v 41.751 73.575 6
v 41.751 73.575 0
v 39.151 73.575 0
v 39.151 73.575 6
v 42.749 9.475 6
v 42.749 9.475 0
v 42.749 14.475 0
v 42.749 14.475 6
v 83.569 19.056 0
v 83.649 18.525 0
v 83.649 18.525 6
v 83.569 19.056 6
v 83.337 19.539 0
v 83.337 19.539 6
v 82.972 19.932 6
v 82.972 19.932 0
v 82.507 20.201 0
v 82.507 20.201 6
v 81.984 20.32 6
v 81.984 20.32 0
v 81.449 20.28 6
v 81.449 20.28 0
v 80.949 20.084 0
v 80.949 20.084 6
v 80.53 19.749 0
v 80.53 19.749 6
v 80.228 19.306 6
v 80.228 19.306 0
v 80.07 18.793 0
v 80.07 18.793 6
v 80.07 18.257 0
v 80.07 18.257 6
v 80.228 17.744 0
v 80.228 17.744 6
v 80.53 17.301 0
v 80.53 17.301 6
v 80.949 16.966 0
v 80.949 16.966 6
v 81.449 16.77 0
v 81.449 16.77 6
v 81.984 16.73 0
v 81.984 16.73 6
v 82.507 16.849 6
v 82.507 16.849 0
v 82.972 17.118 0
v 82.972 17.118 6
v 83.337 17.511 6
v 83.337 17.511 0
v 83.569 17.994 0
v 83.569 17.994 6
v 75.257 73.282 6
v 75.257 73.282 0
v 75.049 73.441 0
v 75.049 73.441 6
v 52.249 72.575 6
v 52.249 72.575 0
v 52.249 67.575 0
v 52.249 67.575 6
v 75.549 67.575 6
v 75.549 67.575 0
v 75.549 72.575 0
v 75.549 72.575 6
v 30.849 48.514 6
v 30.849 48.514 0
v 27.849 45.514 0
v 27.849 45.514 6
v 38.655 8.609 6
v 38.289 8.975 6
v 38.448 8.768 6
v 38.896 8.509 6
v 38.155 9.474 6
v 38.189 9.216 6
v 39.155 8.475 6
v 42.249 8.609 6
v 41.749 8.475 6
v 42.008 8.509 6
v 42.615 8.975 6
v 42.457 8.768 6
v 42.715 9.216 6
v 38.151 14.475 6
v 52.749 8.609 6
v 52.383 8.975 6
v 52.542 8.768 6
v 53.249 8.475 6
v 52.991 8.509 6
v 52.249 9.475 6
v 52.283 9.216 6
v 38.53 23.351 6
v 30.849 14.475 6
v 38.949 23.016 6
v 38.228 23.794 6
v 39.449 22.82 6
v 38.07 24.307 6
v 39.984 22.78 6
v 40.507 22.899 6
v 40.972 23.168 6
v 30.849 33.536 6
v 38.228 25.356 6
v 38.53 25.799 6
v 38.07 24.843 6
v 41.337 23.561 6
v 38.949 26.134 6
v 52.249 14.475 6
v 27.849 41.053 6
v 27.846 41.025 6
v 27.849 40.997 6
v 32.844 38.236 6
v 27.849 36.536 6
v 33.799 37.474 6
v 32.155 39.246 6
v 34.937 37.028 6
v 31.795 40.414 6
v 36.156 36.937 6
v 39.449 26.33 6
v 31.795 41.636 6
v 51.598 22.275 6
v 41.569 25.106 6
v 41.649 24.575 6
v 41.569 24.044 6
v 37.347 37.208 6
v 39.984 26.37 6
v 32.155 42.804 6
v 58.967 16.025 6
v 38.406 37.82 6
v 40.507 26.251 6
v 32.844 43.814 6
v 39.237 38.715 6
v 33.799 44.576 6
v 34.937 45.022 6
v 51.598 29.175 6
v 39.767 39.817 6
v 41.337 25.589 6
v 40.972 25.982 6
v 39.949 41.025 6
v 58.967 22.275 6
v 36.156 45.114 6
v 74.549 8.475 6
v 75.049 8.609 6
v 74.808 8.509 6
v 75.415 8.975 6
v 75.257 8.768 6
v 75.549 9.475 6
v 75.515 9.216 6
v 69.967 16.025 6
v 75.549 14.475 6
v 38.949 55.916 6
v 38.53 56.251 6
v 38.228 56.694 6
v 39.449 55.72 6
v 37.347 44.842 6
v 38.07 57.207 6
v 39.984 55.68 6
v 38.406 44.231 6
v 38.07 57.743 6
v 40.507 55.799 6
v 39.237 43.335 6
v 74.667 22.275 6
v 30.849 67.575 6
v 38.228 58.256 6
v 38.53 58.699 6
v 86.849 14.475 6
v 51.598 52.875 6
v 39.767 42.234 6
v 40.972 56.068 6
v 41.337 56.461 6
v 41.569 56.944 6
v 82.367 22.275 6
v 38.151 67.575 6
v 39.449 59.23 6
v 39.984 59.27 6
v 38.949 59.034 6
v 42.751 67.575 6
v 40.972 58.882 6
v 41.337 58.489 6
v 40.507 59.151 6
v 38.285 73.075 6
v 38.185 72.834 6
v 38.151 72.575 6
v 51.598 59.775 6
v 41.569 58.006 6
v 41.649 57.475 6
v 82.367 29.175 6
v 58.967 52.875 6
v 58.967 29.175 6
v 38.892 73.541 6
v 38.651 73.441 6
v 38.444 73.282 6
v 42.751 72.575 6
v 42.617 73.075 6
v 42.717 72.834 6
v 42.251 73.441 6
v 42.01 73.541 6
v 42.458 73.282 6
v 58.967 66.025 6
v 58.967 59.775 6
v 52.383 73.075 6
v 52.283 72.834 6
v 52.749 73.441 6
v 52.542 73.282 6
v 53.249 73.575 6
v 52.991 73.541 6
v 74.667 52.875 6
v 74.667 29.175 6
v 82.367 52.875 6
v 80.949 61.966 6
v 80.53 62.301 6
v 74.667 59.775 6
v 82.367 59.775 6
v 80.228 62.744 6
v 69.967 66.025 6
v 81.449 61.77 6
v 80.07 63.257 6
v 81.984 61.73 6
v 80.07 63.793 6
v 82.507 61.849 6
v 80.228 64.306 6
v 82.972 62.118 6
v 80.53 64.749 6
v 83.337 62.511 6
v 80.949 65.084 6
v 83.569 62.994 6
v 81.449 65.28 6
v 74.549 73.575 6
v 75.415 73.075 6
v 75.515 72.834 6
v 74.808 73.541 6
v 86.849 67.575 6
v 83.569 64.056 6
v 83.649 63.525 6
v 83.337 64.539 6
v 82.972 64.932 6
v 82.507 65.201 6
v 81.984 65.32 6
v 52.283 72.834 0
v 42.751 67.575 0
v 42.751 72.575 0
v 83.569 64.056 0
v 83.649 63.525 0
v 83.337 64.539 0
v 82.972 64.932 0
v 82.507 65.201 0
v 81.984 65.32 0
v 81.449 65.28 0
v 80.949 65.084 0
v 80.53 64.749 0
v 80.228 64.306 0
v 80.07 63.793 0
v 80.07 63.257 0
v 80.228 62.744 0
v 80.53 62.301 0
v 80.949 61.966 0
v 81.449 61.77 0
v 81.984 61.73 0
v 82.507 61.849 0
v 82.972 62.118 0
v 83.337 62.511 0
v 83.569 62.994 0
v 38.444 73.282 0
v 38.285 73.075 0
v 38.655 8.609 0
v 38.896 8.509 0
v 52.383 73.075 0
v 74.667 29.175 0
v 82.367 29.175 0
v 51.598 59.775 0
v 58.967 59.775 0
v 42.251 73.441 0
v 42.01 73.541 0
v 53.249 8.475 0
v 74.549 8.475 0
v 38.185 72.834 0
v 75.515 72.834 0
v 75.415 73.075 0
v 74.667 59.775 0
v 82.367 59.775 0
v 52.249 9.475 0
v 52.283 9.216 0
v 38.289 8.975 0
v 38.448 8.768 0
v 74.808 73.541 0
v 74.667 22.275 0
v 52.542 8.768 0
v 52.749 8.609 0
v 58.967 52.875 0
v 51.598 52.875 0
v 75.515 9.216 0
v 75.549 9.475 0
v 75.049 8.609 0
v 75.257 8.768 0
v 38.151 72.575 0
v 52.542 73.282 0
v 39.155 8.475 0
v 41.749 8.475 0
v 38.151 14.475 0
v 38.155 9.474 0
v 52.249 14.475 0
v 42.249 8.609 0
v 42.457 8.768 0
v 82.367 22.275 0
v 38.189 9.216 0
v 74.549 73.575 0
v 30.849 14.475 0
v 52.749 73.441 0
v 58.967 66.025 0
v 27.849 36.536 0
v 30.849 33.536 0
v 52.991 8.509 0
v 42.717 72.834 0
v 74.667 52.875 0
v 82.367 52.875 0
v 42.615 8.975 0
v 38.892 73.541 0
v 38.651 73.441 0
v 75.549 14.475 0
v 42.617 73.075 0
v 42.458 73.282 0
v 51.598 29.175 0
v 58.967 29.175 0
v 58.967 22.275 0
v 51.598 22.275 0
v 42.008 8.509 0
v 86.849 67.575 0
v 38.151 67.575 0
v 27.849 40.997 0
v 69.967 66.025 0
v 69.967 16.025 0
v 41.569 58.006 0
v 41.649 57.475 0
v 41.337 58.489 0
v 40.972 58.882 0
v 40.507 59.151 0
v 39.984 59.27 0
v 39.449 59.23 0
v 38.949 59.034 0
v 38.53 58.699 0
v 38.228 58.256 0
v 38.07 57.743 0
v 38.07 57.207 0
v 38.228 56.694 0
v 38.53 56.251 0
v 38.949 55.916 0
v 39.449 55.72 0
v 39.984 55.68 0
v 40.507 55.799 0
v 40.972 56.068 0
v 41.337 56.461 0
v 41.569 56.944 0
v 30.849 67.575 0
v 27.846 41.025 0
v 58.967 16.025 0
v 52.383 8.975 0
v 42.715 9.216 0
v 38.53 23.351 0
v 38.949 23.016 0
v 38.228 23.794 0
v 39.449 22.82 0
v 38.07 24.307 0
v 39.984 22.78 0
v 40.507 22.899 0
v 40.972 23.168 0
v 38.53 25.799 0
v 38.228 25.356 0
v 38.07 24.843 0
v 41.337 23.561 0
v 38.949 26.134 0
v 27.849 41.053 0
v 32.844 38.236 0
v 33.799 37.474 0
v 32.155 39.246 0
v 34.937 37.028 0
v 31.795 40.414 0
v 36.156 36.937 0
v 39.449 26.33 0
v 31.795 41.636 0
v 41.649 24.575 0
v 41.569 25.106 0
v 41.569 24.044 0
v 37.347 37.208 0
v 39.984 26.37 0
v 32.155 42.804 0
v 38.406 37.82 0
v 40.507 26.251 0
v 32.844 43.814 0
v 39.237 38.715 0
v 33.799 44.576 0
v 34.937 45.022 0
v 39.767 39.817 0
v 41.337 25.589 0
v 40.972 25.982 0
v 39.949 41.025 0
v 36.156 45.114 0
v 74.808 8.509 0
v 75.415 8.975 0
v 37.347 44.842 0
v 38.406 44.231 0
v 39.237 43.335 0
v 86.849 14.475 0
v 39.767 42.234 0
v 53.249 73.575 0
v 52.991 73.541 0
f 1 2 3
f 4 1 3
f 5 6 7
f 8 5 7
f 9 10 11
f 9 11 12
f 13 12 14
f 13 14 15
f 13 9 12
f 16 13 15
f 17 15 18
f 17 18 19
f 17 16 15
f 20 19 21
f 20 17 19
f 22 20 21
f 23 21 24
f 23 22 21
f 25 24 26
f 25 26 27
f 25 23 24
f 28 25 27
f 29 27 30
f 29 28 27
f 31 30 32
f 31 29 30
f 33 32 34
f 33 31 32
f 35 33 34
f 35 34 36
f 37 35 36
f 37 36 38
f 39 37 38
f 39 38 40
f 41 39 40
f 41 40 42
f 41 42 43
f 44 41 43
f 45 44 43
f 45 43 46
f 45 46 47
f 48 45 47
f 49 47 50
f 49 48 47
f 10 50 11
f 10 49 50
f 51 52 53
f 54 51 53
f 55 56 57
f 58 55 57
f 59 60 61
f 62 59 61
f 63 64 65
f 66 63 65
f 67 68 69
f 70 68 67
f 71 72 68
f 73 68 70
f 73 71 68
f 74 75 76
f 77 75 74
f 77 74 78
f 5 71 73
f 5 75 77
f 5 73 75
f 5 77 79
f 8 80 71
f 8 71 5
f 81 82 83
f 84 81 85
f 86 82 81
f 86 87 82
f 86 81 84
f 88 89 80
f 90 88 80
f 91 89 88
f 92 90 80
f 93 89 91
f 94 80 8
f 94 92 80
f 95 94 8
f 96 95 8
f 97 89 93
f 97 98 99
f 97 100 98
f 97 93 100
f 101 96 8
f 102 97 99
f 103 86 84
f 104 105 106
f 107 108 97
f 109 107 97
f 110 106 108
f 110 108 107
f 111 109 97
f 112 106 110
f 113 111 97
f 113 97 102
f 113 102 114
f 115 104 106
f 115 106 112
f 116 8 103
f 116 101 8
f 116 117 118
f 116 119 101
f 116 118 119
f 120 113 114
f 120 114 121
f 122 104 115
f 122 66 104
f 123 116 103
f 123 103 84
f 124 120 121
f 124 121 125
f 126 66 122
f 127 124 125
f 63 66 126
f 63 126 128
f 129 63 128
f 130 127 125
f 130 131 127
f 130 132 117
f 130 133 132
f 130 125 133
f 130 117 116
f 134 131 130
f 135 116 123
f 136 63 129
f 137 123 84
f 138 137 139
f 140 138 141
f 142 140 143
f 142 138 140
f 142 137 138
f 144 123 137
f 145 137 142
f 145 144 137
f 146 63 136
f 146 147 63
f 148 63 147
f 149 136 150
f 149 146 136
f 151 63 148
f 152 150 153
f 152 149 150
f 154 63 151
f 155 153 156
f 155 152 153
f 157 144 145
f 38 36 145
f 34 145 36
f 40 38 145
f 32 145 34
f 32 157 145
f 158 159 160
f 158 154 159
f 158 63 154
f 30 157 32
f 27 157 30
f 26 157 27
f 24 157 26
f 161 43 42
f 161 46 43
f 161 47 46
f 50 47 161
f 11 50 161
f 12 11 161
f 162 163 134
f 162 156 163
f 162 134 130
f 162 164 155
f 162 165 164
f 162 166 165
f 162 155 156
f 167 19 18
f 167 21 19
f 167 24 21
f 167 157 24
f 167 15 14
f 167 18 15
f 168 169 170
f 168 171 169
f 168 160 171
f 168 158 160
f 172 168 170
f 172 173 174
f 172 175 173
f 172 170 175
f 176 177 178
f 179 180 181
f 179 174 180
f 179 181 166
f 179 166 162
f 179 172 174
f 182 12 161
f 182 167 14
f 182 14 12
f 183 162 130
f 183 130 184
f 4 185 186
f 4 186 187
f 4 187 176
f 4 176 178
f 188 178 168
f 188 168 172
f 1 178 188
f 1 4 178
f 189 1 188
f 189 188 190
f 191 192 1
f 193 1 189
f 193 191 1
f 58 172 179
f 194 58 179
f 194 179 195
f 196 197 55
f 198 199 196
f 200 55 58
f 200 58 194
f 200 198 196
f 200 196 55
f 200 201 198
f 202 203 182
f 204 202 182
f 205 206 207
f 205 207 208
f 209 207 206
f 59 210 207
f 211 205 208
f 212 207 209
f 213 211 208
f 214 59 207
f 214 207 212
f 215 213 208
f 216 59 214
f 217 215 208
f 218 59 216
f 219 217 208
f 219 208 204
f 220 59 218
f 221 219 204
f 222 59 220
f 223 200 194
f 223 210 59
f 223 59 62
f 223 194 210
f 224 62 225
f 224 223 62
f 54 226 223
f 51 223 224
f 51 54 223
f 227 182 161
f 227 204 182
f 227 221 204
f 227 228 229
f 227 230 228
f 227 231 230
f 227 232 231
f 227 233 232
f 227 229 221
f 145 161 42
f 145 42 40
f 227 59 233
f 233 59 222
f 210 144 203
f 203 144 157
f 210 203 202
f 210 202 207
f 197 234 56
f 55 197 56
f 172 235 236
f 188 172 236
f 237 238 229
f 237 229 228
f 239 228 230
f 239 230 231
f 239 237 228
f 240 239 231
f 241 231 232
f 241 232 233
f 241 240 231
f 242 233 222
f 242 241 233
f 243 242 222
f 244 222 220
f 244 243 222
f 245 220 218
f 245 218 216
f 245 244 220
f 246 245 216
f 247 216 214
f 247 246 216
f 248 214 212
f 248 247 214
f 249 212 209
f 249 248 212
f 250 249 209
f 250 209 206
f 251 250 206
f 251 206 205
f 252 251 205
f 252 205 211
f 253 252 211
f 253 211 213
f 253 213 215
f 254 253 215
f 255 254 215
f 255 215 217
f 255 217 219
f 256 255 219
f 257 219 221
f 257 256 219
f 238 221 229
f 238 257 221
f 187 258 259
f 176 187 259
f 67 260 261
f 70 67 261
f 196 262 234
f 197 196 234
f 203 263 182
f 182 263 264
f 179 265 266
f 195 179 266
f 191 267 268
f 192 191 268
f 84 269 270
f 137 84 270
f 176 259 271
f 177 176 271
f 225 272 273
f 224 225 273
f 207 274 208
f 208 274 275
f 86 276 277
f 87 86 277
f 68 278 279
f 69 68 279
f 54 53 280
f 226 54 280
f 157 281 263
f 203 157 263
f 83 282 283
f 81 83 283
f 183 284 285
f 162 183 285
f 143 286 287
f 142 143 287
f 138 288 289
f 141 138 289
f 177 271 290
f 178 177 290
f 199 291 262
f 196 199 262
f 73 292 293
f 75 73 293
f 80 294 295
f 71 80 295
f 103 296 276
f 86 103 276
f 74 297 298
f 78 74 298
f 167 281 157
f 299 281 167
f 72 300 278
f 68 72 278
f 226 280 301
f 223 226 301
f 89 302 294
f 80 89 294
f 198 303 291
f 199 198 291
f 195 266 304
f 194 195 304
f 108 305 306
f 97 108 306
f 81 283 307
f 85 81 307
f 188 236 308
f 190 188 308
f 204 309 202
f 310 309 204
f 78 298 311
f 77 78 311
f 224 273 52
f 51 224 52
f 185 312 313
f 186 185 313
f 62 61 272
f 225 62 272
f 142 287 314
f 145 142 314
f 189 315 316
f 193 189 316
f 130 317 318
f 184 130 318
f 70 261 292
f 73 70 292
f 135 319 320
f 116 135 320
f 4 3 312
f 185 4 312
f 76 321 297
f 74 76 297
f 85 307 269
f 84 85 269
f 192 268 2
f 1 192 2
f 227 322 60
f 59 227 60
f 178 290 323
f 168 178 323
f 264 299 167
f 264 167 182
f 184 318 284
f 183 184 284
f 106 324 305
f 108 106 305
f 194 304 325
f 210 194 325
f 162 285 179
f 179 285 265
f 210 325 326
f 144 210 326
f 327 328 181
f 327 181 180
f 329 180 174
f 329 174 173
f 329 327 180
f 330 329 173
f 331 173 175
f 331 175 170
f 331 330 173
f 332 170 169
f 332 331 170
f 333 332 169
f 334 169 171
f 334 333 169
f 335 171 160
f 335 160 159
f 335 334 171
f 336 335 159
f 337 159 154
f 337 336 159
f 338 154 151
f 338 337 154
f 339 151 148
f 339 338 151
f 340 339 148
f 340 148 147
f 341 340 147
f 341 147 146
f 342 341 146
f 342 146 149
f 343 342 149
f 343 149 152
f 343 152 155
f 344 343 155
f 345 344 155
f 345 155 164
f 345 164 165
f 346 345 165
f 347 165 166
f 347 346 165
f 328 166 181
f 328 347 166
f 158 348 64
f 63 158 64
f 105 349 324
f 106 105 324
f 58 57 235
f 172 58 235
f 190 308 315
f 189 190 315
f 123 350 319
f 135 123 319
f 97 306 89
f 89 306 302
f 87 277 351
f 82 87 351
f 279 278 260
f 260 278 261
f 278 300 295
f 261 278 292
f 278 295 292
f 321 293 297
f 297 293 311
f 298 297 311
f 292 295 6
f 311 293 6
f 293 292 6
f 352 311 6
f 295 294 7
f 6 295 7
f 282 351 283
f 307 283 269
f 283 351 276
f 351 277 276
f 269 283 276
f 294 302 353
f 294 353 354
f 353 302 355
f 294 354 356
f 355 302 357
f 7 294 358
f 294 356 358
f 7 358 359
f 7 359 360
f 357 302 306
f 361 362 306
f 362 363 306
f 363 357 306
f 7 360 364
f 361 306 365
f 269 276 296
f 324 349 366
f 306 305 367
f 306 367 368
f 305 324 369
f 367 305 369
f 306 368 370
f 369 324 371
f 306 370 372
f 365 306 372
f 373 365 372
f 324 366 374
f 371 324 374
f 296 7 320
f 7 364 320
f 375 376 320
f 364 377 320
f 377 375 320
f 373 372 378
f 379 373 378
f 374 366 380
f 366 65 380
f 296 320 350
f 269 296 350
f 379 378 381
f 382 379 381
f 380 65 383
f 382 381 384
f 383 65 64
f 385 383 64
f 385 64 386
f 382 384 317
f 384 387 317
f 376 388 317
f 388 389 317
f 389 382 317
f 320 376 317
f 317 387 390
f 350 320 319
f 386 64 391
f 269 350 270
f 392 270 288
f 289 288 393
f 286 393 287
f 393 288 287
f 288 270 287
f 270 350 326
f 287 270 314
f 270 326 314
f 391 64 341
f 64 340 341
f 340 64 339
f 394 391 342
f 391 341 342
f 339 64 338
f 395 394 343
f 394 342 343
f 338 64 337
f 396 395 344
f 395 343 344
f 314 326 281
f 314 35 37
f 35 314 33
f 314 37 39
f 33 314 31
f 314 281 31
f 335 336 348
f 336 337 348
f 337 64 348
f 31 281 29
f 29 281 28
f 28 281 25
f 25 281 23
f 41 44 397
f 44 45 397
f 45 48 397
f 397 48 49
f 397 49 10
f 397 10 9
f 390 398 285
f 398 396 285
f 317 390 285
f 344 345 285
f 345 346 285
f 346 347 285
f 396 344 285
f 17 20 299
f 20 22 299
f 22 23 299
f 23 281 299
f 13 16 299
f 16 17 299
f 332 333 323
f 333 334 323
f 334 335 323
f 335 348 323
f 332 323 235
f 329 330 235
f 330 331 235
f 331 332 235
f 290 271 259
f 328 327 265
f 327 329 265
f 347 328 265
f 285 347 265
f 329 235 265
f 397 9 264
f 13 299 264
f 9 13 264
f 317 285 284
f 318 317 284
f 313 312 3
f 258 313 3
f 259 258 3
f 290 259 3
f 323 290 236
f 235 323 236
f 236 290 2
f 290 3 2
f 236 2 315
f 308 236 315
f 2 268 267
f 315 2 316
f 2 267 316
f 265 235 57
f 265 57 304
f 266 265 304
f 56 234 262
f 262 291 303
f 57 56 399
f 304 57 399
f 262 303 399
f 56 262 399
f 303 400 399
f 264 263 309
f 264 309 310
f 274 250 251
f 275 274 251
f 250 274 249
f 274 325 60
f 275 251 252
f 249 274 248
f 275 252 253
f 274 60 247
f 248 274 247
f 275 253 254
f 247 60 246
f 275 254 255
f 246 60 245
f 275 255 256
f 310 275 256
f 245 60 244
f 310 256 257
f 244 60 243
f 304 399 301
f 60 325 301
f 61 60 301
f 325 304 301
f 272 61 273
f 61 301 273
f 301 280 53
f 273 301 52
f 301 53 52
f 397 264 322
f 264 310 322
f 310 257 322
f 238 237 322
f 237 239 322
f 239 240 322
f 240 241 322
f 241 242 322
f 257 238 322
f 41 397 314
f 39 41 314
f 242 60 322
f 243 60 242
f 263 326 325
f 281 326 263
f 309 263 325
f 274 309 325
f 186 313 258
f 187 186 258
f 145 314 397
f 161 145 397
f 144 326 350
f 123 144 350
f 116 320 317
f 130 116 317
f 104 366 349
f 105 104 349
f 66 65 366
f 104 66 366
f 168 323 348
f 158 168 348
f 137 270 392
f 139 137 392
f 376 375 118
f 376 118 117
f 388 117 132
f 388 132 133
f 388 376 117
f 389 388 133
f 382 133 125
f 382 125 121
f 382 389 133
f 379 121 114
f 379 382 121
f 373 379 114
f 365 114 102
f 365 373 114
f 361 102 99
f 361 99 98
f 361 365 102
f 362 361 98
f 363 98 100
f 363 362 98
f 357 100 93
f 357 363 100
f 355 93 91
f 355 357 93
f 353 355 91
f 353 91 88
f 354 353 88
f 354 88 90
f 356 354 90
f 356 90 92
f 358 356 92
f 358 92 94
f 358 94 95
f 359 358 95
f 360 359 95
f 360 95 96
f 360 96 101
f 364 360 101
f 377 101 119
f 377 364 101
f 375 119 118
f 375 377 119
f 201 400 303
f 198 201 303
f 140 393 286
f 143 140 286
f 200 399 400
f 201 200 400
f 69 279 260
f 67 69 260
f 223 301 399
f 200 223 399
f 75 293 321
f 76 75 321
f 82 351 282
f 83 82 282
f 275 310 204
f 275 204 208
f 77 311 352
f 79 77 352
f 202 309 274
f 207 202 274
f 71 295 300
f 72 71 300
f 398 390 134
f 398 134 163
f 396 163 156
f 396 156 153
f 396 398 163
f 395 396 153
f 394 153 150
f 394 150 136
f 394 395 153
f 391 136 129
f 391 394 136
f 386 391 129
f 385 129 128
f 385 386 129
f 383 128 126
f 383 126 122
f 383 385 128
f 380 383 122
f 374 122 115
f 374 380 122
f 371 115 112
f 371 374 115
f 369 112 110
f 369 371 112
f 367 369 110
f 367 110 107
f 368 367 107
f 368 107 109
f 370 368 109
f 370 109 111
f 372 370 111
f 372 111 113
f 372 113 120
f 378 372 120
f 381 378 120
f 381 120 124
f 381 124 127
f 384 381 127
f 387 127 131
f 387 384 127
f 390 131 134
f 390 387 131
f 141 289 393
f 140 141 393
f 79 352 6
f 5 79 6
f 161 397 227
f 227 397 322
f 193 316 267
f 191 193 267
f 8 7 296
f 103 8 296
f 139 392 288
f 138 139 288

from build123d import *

# Parameters (mm, degrees)
MODEL_R                  = 1.8
MODEL_R_2                = 4.1
MODEL_W                  = 7.7
MODEL_H                  = 6.9
RESSALTO_EXTRUS_O1_DEPTH = 6


with BuildPart() as part:
    # Model → Ressalto-extrusão1 (new body)
    with BuildSketch(Plane.XY):
        Polygon((52.383398063, 73.075042987), (52.28349764, 72.833862032), (52.249423467, 72.575042987), (52.249423467, 67.575042987), (42.750846371, 67.575042987), (42.750846371, 72.575042987), (42.716772197, 72.833862032), (42.616871774, 73.075042987), (42.457953152, 73.282149768), (42.250846371, 73.441068391), (42.009665416, 73.540968814), (41.750846371, 73.575042987), (39.151153585, 73.575042987), (38.89233454, 73.540968814), (38.651153585, 73.441068391), (38.444046804, 73.282149768), (38.285128182, 73.075042987), (38.185227759, 72.833862032), (38.151153585, 72.575042987), (38.151153585, 67.575042987), (30.849423467, 67.575042987), (30.849423467, 48.514129082), (27.849423467, 45.514129082), (27.849423467, 41.05308967), (27.845731051, 41.025042987), (27.849423467, 40.996996305), (27.849423467, 36.535956893), (30.849423467, 33.535956893), (30.849423467, 14.475042987), (38.151153585, 14.475042987), (38.155087445, 9.474256339), (38.189331183, 9.215590795), (38.289324067, 8.974588885), (38.448258531, 8.767658139), (38.655314239, 8.608886505), (38.896394733, 8.509083236), (39.155087136, 8.475042987), (41.749423467, 8.475042987), (42.008242512, 8.509117161), (42.249423467, 8.609017584), (42.456530248, 8.767936206), (42.61544887, 8.975042987), (42.715349293, 9.216223942), (42.749423467, 9.475042987), (42.749423467, 14.475042987), (52.249423467, 14.475042987), (52.249423467, 9.475042987), (52.28349764, 9.216223942), (52.383398063, 8.975042987), (52.542316685, 8.767936206), (52.749423467, 8.609017584), (52.990604422, 8.509117161), (53.249423467, 8.475042987), (74.549423467, 8.475042987), (74.808242512, 8.509117161), (75.049423467, 8.609017584), (75.256530248, 8.767936206), (75.41544887, 8.975042987), (75.515349293, 9.216223942), (75.549423467, 9.475042987), (75.549423467, 14.475042987), (86.849423467, 14.475042987), (86.849423467, 67.575042987), (75.549423467, 67.575042987), (75.549423467, 72.575042987), (75.515349293, 72.833862032), (75.41544887, 73.075042987), (75.256530248, 73.282149768), (75.049423467, 73.441068391), (74.808242512, 73.540968814), (74.549423467, 73.575042987), (53.249423467, 73.575042987), (52.990604421, 73.540968814), (52.749423467, 73.441068391), (52.542316685, 73.282149768), align=None)
        with Locations((81.849423467, 18.525042987)):
            Circle(MODEL_R, mode=Mode.SUBTRACT)
        with Locations((39.849423467, 24.575042987)):
            Circle(MODEL_R, mode=Mode.SUBTRACT)
        with Locations((35.849423467, 41.025042987)):
            Circle(MODEL_R_2, mode=Mode.SUBTRACT)
        with Locations((39.849423467, 57.475042987)):
            Circle(MODEL_R, mode=Mode.SUBTRACT)
        with Locations((81.849423467, 63.525042987)):
            Circle(MODEL_R, mode=Mode.SUBTRACT)
        Polygon((58.966889554, 29.175042987), (58.966889554, 52.875042987), (51.598425396, 52.875042987), (51.598425396, 59.775042987), (58.966889554, 59.775042987), (58.966889554, 66.025032836), (69.966884557, 66.025032836), (69.966884557, 16.025053138), (58.966889554, 16.025053138), (58.966889554, 22.275042987), (51.598425396, 22.275042987), (51.598425396, 29.175042987), align=None, mode=Mode.SUBTRACT)
        with Locations((78.516884557, 56.325042987)):
            Rectangle(MODEL_W, MODEL_H, mode=Mode.SUBTRACT)
        with Locations((78.516884557, 25.725042987)):
            Rectangle(MODEL_W, MODEL_H, mode=Mode.SUBTRACT)
    extrude(amount=RESSALTO_EXTRUS_O1_DEPTH)


solid = part.part
